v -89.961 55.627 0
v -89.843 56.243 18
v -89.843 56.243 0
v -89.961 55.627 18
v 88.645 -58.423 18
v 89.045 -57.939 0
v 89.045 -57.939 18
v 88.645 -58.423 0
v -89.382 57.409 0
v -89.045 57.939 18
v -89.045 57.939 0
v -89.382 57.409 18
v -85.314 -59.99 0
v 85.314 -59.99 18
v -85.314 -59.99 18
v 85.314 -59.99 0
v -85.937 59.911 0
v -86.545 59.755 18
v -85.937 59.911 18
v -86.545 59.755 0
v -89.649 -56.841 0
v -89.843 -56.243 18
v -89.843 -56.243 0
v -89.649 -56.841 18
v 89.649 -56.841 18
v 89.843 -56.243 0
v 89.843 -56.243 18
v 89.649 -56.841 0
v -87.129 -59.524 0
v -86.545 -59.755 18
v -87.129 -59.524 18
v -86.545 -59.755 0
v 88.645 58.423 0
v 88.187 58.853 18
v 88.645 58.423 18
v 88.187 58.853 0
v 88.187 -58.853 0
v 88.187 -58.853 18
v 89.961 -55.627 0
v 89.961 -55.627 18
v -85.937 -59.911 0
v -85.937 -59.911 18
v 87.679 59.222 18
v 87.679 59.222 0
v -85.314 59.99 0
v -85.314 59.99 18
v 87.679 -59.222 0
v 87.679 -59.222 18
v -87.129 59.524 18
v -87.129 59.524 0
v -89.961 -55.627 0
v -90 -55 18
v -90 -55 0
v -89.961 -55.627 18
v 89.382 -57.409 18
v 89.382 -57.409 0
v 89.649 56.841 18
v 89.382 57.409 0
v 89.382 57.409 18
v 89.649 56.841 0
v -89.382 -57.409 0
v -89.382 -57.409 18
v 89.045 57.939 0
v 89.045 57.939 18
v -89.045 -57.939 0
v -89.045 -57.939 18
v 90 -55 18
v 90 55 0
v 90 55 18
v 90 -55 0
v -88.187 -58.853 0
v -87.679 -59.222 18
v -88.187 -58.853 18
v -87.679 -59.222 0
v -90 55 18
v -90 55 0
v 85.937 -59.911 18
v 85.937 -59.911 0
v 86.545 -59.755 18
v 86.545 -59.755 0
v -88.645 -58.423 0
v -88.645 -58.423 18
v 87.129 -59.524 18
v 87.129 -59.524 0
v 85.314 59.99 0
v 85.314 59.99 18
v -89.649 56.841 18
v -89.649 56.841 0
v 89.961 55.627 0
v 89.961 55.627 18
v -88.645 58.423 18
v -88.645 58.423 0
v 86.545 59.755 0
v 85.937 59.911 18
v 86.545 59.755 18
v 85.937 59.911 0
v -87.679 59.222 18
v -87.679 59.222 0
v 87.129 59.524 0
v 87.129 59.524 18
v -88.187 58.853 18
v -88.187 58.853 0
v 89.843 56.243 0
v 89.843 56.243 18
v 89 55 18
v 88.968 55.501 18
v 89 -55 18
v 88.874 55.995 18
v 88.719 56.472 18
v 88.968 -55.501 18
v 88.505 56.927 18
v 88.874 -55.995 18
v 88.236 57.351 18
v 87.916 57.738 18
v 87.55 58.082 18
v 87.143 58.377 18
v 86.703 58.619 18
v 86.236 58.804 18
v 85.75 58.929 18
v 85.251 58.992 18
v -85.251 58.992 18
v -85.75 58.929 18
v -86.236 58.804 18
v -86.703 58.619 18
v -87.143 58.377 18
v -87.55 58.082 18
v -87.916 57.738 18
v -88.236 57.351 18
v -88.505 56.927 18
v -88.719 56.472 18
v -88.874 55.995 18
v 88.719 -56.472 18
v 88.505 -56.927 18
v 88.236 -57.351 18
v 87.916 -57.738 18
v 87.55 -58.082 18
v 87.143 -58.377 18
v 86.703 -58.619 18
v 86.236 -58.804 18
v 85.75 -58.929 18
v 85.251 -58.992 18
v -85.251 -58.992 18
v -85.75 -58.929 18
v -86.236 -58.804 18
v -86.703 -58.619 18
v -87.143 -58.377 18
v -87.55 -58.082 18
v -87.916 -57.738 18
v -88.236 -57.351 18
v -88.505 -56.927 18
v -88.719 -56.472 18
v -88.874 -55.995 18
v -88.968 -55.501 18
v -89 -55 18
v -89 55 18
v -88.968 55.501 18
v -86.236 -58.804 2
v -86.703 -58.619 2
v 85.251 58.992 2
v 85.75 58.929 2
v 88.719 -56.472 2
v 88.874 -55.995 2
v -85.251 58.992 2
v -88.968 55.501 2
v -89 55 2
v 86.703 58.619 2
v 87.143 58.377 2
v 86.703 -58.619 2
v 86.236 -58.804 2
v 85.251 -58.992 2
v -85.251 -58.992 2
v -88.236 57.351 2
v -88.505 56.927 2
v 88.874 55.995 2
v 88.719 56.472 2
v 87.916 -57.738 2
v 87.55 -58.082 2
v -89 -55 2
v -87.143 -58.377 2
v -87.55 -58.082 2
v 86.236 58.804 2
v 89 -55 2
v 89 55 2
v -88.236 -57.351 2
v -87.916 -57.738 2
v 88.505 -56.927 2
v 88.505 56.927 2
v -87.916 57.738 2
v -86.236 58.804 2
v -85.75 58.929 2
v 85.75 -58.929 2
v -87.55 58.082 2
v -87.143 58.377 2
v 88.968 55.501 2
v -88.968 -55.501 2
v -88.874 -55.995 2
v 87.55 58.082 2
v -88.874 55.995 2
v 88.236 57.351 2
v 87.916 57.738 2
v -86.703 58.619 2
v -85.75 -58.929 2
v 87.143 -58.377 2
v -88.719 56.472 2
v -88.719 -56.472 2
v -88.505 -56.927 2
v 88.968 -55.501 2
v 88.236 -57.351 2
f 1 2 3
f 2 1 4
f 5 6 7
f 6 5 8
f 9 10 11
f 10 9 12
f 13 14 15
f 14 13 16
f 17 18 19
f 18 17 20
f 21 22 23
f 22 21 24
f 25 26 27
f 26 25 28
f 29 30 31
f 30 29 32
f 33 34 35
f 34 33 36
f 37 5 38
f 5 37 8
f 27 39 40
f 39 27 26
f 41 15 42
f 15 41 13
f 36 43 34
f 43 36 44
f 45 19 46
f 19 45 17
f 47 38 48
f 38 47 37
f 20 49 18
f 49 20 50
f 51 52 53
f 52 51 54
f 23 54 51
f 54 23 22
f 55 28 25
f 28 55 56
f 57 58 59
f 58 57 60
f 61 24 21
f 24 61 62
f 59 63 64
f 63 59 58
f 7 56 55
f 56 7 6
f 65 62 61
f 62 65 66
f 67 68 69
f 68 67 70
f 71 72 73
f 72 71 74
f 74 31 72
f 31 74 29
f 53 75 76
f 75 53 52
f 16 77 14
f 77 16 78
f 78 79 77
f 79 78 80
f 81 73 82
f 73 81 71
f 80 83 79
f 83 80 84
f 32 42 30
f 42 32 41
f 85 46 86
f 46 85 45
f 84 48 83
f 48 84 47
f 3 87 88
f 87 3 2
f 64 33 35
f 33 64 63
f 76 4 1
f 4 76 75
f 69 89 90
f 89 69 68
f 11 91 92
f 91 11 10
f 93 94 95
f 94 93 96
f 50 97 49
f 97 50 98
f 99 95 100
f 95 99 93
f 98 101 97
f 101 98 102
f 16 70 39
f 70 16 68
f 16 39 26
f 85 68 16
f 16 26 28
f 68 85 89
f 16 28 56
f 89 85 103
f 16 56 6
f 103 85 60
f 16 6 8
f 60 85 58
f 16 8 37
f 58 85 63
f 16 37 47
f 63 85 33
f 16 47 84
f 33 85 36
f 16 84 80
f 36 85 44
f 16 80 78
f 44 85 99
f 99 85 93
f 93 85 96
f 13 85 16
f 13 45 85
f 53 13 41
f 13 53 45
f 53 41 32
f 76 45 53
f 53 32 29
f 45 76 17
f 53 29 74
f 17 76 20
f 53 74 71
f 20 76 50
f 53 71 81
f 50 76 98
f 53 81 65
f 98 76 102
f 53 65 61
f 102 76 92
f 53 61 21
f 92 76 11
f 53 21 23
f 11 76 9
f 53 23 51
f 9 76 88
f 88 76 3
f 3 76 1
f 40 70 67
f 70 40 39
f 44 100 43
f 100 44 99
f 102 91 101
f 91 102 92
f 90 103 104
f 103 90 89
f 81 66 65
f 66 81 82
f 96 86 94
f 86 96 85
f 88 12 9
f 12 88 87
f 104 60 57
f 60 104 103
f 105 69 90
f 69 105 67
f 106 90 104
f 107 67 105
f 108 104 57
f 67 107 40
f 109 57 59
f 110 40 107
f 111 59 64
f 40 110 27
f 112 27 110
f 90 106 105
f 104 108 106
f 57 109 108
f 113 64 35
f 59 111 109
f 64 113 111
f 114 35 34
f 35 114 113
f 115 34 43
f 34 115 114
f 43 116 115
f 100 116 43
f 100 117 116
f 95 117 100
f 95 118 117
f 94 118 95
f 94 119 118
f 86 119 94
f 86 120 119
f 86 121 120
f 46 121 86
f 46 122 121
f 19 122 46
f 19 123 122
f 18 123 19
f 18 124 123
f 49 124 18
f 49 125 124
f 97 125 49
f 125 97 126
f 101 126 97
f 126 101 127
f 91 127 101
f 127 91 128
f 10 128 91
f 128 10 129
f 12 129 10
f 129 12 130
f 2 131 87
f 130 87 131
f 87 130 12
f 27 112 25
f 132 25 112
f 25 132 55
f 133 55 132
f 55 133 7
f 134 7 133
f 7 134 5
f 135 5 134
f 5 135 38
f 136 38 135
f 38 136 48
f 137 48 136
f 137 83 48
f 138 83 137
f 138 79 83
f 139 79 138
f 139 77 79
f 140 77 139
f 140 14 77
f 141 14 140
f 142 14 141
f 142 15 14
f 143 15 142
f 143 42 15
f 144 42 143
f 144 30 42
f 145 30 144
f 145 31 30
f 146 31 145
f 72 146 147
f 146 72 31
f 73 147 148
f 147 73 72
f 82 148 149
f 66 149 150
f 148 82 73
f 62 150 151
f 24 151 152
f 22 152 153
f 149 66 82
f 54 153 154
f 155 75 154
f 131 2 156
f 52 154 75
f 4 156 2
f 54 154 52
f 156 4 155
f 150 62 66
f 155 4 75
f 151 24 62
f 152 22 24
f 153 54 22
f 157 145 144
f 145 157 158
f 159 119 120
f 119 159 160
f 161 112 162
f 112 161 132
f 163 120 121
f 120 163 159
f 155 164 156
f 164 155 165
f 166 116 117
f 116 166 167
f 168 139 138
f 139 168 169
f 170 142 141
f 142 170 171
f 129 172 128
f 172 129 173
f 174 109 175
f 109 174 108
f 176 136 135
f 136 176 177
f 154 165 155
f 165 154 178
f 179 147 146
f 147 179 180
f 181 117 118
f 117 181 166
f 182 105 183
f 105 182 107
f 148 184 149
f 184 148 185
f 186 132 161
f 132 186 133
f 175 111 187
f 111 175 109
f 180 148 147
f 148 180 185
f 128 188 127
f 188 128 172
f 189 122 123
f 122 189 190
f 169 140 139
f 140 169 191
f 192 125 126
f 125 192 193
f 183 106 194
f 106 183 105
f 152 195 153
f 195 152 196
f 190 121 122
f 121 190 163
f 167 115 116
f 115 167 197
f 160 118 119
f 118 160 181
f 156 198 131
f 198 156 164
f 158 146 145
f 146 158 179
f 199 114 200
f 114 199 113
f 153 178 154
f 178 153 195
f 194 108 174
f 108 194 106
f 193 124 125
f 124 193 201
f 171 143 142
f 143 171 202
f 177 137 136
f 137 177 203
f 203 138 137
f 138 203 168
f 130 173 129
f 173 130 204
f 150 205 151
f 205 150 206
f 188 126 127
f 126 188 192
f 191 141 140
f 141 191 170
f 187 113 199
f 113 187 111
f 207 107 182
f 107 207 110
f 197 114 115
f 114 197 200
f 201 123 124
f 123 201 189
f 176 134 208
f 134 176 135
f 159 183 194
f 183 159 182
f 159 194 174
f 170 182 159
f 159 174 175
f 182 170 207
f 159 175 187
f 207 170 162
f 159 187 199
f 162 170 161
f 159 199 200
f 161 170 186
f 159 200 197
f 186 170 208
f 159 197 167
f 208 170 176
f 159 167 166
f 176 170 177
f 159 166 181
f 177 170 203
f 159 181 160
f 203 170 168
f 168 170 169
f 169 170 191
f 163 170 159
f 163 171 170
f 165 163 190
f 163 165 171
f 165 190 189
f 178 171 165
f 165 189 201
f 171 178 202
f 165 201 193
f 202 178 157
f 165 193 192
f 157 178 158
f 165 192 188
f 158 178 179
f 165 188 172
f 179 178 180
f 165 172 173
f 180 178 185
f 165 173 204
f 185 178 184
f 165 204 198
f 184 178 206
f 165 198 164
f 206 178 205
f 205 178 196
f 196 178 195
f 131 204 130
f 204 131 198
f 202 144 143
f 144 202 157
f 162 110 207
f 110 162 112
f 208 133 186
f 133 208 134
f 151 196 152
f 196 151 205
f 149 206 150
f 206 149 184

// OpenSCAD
$fn = 50;


difference() {
	union() {
		hull() {
			translate(v = [-85.0000000000, 55.0000000000, 0]) {
				cylinder(h = 18, r = 5);
			}
			translate(v = [85.0000000000, 55.0000000000, 0]) {
				cylinder(h = 18, r = 5);
			}
			translate(v = [-85.0000000000, -55.0000000000, 0]) {
				cylinder(h = 18, r = 5);
			}
			translate(v = [85.0000000000, -55.0000000000, 0]) {
				cylinder(h = 18, r = 5);
			}
		}
	}
	union() {
		translate(v = [0, 0, 2]) {
			hull() {
				translate(v = [-85.0000000000, 55.0000000000, 0]) {
					cylinder(h = 16, r = 4);
				}
				translate(v = [85.0000000000, 55.0000000000, 0]) {
					cylinder(h = 16, r = 4);
				}
				translate(v = [-85.0000000000, -55.0000000000, 0]) {
					cylinder(h = 16, r = 4);
				}
				translate(v = [85.0000000000, -55.0000000000, 0]) {
					cylinder(h = 16, r = 4);
				}
			}
		}
	}
}
